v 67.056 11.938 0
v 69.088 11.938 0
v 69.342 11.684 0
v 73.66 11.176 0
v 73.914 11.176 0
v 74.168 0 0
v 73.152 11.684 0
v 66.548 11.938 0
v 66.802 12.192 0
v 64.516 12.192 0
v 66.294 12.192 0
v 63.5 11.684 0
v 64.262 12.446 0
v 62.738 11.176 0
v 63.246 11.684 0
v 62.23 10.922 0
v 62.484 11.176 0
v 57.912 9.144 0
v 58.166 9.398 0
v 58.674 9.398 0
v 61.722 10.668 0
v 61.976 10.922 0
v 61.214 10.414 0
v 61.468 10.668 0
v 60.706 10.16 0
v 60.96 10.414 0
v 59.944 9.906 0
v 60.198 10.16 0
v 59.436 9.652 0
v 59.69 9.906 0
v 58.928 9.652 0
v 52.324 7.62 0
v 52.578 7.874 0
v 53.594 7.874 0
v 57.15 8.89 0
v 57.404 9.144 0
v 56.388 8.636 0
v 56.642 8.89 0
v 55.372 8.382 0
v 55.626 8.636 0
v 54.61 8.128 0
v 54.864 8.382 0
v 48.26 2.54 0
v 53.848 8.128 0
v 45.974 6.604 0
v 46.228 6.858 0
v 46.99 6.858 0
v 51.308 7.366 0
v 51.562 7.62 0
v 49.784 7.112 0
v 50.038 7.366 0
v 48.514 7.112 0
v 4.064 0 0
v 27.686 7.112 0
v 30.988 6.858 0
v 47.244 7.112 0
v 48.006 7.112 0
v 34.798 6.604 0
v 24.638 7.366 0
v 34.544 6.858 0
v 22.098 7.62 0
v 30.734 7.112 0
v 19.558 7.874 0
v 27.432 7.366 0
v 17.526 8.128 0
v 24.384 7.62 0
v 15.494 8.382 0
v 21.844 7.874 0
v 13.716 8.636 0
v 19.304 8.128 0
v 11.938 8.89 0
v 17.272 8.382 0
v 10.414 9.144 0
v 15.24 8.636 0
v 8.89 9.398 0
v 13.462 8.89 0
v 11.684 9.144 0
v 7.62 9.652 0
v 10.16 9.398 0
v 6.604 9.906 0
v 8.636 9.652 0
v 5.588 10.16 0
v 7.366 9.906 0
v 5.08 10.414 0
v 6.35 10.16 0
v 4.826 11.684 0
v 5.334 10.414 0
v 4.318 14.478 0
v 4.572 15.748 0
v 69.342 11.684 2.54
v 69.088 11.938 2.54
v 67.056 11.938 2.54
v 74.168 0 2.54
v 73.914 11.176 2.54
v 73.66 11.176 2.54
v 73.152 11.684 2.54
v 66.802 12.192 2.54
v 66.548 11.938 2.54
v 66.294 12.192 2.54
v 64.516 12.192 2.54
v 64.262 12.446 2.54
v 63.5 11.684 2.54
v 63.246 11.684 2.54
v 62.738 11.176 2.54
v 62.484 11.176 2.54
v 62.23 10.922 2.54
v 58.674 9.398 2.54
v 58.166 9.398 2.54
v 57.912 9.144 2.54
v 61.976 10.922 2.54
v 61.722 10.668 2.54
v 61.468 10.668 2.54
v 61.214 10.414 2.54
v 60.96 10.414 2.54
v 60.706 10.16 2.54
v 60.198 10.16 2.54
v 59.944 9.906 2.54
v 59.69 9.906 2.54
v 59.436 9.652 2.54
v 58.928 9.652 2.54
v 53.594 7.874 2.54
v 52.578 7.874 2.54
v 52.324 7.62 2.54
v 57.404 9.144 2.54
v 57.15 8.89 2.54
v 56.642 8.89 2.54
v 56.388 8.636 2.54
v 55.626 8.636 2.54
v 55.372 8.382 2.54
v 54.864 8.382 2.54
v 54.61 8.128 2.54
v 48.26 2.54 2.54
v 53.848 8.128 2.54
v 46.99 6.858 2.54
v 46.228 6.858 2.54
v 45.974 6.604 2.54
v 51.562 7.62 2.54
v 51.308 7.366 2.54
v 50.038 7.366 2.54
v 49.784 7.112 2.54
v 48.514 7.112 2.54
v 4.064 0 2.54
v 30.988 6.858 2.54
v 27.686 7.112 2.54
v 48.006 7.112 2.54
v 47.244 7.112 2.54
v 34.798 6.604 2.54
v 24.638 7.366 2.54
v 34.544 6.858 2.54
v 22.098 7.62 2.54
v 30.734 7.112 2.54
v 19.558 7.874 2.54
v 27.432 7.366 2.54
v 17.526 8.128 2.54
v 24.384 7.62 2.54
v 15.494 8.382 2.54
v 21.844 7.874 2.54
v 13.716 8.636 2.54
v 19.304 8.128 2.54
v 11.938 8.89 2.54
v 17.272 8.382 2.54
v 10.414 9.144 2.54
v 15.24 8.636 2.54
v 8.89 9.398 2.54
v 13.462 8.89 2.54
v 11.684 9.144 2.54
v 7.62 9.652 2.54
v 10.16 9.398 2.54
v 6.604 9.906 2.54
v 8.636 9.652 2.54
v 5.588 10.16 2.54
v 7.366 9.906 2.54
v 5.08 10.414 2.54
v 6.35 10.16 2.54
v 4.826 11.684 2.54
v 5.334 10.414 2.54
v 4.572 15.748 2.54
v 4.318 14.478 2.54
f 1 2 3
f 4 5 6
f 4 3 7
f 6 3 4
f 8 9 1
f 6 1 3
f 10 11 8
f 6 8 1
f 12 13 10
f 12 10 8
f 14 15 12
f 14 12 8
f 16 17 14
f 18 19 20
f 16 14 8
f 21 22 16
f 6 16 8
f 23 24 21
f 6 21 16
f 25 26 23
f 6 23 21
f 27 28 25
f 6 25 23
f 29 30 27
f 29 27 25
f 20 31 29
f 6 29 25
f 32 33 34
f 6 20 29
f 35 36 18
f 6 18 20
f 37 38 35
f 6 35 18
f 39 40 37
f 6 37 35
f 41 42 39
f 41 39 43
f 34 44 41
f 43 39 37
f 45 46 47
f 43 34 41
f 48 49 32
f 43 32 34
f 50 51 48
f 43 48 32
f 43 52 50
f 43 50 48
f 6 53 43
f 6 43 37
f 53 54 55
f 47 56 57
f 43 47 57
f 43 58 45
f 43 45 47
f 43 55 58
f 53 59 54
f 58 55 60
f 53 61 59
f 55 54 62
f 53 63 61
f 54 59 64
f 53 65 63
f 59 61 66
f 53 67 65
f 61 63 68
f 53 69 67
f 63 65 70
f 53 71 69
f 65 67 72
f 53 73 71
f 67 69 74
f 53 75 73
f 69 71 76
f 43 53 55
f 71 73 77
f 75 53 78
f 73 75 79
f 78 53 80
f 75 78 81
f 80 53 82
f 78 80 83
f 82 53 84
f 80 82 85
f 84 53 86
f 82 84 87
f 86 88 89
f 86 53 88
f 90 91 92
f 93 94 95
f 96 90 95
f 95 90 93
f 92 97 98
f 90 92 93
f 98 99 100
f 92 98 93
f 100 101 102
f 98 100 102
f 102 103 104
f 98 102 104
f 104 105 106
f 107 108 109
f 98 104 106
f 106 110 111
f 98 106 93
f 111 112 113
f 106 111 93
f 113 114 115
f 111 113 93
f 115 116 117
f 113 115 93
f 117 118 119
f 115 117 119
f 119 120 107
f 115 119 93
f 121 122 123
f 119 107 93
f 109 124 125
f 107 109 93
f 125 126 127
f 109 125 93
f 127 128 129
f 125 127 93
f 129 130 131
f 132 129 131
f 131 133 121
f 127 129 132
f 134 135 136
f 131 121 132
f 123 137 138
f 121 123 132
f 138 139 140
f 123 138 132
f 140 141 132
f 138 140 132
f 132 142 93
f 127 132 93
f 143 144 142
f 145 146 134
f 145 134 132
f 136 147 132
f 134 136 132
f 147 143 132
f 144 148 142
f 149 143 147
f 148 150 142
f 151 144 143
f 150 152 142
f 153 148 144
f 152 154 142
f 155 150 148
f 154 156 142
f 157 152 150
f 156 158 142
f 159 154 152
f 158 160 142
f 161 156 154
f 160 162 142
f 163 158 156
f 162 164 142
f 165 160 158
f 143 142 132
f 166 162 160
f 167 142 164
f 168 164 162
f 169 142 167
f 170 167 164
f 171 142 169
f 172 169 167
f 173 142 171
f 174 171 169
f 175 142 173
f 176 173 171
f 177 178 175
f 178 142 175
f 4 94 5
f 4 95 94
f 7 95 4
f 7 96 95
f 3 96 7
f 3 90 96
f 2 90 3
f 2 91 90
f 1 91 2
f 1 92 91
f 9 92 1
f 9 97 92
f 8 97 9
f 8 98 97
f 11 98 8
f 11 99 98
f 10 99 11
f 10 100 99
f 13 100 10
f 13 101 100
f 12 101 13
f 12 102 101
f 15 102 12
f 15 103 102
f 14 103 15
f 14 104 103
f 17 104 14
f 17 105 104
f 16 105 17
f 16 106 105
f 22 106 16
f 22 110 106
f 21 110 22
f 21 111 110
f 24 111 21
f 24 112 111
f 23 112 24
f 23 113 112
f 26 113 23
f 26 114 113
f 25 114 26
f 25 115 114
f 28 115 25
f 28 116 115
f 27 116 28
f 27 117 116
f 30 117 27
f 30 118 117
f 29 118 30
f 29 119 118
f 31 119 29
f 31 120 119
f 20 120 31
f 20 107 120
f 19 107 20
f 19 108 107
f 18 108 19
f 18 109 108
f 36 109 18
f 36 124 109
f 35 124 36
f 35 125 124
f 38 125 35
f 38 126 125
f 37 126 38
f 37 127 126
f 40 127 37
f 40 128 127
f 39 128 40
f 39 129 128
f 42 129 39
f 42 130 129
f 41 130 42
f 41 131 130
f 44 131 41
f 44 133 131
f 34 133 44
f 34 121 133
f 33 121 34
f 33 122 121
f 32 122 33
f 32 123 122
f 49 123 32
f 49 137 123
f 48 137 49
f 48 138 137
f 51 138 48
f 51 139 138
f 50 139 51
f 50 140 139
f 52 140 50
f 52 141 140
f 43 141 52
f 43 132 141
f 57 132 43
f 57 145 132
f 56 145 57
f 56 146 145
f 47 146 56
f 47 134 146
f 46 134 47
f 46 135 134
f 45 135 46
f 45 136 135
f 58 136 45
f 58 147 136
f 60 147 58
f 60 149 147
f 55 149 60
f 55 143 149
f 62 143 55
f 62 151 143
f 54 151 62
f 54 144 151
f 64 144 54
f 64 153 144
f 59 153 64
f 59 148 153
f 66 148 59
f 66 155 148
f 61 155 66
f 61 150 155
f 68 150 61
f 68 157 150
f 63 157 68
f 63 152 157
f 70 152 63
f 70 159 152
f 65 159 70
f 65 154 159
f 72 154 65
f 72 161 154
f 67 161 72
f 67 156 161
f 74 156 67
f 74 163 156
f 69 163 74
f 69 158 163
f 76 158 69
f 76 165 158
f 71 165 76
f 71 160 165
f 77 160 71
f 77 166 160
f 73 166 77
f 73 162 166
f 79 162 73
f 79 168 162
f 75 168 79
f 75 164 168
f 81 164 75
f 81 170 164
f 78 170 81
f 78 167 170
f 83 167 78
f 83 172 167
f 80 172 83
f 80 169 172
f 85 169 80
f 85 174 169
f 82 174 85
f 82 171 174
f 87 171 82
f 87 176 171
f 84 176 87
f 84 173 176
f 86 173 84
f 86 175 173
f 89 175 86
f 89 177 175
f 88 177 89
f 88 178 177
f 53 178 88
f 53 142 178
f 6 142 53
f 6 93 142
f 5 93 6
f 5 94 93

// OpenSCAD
ViewScale = [0.0254, 0.0254, 0.0254];

module bridgeData()
{
polygon(points=[[0,0],
[0,0],[10,0],[20,0],[30,0],[40,0],[50,0],[60,0],[70,0],[80,0],[90,0],[100,0],[110,0],[120,0],[130,0],[140,0],[150,0],[160,0],[170,570],[180,620],[190,460],[200,410],[210,410],[220,400],[230,400],[240,400],[250,400],[260,390],[270,390],[280,390],[290,390],[300,380],[310,380],[320,380],[330,380],[340,380],[350,370],[360,370],[370,370],[380,370],[390,370],[400,370],[410,360],[420,360],[430,360],[440,360],[450,360],[460,360],[470,350],[480,350],[490,350],[500,350],[510,350],[520,350],[530,350],[540,340],[550,340],[560,340],[570,340],[580,340],[590,340],[600,340],[610,330],[620,330],[630,330],[640,330],[650,330],[660,330],[670,330],[680,330],[690,320],[700,320],[710,320],[720,320],[730,320],[740,320],[750,320],[760,320],[770,310],[780,310],[790,310],[800,310],[810,310],[820,310],[830,310],[840,310],[850,310],[860,310],[870,300],[880,300],[890,300],[900,300],[910,300],[920,300],[930,300],[940,300],[950,300],[960,300],[970,290],[980,290],[990,290],[1000,290],[1010,290],[1020,290],[1030,290],[1040,290],[1050,290],[1060,290],[1070,290],[1080,290],[1090,280],[1100,280],[1110,280],[1120,280],[1130,280],[1140,280],[1150,280],[1160,280],[1170,280],[1180,280],[1190,280],[1200,280],[1210,280],[1220,270],[1230,270],[1240,270],[1250,270],[1260,270],[1270,270],[1280,270],[1290,270],[1300,270],[1310,270],[1320,270],[1330,270],[1340,270],[1350,270],[1360,270],[1370,260],[1380,260],[1390,260],[1400,260],[1410,260],[1420,260],[1430,260],[1440,260],[1450,260],[1460,260],[1470,260],[1480,260],[1490,260],[1500,260],[1510,260],[1520,260],[1530,260],[1540,260],[1550,260],[1560,260],[1570,260],[1580,260],[1590,260],[1600,260],[1610,260],[1620,260],[1630,260],[1640,260],[1650,260],[1660,260],[1670,260],[1680,260],[1690,260],[1700,260],[1710,260],[1720,260],[1730,260],[1740,260],[1750,260],[1760,260],[1770,260],[1780,260],[1790,260],[1800,260],[1810,260],[1820,270],[1830,270],[1840,270],[1850,270],[1860,280],[1870,280],[1880,280],[1890,280],[1900,100],[1910,280],[1920,280],[1930,280],[1940,280],[1950,280],[1960,280],[1970,290],[1980,290],[1990,290],[2000,290],[2010,290],[2020,290],[2030,300],[2040,300],[2050,300],[2060,300],[2070,310],[2080,310],[2090,310],[2100,310],[2110,310],[2120,320],[2130,320],[2140,320],[2150,320],[2160,330],[2170,330],[2180,330],[2190,340],[2200,340],[2210,340],[2220,340],[2230,350],[2240,350],[2250,350],[2260,360],[2270,360],[2280,360],[2290,370],[2300,370],[2310,370],[2320,380],[2330,380],[2340,380],[2350,390],[2360,390],[2370,400],[2380,400],[2390,400],[2400,410],[2410,410],[2420,420],[2430,420],[2440,430],[2450,430],[2460,440],[2470,440],[2480,450],[2490,460],[2500,460],[2510,470],[2520,480],[2530,490],[2540,480],[2550,480],[2560,480],[2570,480],[2580,480],[2590,480],[2600,480],[2610,480],[2620,470],[2630,480],[2640,470],[2650,470],[2660,470],[2670,470],[2680,470],[2690,470],[2700,470],[2710,470],[2720,470],[2730,460],[2740,460],[2750,460],[2760,460],[2770,460],[2780,460],[2790,460],[2800,460],[2810,460],[2820,460],[2830,460],[2840,460],[2850,460],[2860,460],[2870,460],[2880,460],[2890,450],[2900,440],[2910,440],[2920,0],[2930,0]],convexity=1);
}

scale(ViewScale)
{
    linear_extrude(100)
    bridgeData();
}
